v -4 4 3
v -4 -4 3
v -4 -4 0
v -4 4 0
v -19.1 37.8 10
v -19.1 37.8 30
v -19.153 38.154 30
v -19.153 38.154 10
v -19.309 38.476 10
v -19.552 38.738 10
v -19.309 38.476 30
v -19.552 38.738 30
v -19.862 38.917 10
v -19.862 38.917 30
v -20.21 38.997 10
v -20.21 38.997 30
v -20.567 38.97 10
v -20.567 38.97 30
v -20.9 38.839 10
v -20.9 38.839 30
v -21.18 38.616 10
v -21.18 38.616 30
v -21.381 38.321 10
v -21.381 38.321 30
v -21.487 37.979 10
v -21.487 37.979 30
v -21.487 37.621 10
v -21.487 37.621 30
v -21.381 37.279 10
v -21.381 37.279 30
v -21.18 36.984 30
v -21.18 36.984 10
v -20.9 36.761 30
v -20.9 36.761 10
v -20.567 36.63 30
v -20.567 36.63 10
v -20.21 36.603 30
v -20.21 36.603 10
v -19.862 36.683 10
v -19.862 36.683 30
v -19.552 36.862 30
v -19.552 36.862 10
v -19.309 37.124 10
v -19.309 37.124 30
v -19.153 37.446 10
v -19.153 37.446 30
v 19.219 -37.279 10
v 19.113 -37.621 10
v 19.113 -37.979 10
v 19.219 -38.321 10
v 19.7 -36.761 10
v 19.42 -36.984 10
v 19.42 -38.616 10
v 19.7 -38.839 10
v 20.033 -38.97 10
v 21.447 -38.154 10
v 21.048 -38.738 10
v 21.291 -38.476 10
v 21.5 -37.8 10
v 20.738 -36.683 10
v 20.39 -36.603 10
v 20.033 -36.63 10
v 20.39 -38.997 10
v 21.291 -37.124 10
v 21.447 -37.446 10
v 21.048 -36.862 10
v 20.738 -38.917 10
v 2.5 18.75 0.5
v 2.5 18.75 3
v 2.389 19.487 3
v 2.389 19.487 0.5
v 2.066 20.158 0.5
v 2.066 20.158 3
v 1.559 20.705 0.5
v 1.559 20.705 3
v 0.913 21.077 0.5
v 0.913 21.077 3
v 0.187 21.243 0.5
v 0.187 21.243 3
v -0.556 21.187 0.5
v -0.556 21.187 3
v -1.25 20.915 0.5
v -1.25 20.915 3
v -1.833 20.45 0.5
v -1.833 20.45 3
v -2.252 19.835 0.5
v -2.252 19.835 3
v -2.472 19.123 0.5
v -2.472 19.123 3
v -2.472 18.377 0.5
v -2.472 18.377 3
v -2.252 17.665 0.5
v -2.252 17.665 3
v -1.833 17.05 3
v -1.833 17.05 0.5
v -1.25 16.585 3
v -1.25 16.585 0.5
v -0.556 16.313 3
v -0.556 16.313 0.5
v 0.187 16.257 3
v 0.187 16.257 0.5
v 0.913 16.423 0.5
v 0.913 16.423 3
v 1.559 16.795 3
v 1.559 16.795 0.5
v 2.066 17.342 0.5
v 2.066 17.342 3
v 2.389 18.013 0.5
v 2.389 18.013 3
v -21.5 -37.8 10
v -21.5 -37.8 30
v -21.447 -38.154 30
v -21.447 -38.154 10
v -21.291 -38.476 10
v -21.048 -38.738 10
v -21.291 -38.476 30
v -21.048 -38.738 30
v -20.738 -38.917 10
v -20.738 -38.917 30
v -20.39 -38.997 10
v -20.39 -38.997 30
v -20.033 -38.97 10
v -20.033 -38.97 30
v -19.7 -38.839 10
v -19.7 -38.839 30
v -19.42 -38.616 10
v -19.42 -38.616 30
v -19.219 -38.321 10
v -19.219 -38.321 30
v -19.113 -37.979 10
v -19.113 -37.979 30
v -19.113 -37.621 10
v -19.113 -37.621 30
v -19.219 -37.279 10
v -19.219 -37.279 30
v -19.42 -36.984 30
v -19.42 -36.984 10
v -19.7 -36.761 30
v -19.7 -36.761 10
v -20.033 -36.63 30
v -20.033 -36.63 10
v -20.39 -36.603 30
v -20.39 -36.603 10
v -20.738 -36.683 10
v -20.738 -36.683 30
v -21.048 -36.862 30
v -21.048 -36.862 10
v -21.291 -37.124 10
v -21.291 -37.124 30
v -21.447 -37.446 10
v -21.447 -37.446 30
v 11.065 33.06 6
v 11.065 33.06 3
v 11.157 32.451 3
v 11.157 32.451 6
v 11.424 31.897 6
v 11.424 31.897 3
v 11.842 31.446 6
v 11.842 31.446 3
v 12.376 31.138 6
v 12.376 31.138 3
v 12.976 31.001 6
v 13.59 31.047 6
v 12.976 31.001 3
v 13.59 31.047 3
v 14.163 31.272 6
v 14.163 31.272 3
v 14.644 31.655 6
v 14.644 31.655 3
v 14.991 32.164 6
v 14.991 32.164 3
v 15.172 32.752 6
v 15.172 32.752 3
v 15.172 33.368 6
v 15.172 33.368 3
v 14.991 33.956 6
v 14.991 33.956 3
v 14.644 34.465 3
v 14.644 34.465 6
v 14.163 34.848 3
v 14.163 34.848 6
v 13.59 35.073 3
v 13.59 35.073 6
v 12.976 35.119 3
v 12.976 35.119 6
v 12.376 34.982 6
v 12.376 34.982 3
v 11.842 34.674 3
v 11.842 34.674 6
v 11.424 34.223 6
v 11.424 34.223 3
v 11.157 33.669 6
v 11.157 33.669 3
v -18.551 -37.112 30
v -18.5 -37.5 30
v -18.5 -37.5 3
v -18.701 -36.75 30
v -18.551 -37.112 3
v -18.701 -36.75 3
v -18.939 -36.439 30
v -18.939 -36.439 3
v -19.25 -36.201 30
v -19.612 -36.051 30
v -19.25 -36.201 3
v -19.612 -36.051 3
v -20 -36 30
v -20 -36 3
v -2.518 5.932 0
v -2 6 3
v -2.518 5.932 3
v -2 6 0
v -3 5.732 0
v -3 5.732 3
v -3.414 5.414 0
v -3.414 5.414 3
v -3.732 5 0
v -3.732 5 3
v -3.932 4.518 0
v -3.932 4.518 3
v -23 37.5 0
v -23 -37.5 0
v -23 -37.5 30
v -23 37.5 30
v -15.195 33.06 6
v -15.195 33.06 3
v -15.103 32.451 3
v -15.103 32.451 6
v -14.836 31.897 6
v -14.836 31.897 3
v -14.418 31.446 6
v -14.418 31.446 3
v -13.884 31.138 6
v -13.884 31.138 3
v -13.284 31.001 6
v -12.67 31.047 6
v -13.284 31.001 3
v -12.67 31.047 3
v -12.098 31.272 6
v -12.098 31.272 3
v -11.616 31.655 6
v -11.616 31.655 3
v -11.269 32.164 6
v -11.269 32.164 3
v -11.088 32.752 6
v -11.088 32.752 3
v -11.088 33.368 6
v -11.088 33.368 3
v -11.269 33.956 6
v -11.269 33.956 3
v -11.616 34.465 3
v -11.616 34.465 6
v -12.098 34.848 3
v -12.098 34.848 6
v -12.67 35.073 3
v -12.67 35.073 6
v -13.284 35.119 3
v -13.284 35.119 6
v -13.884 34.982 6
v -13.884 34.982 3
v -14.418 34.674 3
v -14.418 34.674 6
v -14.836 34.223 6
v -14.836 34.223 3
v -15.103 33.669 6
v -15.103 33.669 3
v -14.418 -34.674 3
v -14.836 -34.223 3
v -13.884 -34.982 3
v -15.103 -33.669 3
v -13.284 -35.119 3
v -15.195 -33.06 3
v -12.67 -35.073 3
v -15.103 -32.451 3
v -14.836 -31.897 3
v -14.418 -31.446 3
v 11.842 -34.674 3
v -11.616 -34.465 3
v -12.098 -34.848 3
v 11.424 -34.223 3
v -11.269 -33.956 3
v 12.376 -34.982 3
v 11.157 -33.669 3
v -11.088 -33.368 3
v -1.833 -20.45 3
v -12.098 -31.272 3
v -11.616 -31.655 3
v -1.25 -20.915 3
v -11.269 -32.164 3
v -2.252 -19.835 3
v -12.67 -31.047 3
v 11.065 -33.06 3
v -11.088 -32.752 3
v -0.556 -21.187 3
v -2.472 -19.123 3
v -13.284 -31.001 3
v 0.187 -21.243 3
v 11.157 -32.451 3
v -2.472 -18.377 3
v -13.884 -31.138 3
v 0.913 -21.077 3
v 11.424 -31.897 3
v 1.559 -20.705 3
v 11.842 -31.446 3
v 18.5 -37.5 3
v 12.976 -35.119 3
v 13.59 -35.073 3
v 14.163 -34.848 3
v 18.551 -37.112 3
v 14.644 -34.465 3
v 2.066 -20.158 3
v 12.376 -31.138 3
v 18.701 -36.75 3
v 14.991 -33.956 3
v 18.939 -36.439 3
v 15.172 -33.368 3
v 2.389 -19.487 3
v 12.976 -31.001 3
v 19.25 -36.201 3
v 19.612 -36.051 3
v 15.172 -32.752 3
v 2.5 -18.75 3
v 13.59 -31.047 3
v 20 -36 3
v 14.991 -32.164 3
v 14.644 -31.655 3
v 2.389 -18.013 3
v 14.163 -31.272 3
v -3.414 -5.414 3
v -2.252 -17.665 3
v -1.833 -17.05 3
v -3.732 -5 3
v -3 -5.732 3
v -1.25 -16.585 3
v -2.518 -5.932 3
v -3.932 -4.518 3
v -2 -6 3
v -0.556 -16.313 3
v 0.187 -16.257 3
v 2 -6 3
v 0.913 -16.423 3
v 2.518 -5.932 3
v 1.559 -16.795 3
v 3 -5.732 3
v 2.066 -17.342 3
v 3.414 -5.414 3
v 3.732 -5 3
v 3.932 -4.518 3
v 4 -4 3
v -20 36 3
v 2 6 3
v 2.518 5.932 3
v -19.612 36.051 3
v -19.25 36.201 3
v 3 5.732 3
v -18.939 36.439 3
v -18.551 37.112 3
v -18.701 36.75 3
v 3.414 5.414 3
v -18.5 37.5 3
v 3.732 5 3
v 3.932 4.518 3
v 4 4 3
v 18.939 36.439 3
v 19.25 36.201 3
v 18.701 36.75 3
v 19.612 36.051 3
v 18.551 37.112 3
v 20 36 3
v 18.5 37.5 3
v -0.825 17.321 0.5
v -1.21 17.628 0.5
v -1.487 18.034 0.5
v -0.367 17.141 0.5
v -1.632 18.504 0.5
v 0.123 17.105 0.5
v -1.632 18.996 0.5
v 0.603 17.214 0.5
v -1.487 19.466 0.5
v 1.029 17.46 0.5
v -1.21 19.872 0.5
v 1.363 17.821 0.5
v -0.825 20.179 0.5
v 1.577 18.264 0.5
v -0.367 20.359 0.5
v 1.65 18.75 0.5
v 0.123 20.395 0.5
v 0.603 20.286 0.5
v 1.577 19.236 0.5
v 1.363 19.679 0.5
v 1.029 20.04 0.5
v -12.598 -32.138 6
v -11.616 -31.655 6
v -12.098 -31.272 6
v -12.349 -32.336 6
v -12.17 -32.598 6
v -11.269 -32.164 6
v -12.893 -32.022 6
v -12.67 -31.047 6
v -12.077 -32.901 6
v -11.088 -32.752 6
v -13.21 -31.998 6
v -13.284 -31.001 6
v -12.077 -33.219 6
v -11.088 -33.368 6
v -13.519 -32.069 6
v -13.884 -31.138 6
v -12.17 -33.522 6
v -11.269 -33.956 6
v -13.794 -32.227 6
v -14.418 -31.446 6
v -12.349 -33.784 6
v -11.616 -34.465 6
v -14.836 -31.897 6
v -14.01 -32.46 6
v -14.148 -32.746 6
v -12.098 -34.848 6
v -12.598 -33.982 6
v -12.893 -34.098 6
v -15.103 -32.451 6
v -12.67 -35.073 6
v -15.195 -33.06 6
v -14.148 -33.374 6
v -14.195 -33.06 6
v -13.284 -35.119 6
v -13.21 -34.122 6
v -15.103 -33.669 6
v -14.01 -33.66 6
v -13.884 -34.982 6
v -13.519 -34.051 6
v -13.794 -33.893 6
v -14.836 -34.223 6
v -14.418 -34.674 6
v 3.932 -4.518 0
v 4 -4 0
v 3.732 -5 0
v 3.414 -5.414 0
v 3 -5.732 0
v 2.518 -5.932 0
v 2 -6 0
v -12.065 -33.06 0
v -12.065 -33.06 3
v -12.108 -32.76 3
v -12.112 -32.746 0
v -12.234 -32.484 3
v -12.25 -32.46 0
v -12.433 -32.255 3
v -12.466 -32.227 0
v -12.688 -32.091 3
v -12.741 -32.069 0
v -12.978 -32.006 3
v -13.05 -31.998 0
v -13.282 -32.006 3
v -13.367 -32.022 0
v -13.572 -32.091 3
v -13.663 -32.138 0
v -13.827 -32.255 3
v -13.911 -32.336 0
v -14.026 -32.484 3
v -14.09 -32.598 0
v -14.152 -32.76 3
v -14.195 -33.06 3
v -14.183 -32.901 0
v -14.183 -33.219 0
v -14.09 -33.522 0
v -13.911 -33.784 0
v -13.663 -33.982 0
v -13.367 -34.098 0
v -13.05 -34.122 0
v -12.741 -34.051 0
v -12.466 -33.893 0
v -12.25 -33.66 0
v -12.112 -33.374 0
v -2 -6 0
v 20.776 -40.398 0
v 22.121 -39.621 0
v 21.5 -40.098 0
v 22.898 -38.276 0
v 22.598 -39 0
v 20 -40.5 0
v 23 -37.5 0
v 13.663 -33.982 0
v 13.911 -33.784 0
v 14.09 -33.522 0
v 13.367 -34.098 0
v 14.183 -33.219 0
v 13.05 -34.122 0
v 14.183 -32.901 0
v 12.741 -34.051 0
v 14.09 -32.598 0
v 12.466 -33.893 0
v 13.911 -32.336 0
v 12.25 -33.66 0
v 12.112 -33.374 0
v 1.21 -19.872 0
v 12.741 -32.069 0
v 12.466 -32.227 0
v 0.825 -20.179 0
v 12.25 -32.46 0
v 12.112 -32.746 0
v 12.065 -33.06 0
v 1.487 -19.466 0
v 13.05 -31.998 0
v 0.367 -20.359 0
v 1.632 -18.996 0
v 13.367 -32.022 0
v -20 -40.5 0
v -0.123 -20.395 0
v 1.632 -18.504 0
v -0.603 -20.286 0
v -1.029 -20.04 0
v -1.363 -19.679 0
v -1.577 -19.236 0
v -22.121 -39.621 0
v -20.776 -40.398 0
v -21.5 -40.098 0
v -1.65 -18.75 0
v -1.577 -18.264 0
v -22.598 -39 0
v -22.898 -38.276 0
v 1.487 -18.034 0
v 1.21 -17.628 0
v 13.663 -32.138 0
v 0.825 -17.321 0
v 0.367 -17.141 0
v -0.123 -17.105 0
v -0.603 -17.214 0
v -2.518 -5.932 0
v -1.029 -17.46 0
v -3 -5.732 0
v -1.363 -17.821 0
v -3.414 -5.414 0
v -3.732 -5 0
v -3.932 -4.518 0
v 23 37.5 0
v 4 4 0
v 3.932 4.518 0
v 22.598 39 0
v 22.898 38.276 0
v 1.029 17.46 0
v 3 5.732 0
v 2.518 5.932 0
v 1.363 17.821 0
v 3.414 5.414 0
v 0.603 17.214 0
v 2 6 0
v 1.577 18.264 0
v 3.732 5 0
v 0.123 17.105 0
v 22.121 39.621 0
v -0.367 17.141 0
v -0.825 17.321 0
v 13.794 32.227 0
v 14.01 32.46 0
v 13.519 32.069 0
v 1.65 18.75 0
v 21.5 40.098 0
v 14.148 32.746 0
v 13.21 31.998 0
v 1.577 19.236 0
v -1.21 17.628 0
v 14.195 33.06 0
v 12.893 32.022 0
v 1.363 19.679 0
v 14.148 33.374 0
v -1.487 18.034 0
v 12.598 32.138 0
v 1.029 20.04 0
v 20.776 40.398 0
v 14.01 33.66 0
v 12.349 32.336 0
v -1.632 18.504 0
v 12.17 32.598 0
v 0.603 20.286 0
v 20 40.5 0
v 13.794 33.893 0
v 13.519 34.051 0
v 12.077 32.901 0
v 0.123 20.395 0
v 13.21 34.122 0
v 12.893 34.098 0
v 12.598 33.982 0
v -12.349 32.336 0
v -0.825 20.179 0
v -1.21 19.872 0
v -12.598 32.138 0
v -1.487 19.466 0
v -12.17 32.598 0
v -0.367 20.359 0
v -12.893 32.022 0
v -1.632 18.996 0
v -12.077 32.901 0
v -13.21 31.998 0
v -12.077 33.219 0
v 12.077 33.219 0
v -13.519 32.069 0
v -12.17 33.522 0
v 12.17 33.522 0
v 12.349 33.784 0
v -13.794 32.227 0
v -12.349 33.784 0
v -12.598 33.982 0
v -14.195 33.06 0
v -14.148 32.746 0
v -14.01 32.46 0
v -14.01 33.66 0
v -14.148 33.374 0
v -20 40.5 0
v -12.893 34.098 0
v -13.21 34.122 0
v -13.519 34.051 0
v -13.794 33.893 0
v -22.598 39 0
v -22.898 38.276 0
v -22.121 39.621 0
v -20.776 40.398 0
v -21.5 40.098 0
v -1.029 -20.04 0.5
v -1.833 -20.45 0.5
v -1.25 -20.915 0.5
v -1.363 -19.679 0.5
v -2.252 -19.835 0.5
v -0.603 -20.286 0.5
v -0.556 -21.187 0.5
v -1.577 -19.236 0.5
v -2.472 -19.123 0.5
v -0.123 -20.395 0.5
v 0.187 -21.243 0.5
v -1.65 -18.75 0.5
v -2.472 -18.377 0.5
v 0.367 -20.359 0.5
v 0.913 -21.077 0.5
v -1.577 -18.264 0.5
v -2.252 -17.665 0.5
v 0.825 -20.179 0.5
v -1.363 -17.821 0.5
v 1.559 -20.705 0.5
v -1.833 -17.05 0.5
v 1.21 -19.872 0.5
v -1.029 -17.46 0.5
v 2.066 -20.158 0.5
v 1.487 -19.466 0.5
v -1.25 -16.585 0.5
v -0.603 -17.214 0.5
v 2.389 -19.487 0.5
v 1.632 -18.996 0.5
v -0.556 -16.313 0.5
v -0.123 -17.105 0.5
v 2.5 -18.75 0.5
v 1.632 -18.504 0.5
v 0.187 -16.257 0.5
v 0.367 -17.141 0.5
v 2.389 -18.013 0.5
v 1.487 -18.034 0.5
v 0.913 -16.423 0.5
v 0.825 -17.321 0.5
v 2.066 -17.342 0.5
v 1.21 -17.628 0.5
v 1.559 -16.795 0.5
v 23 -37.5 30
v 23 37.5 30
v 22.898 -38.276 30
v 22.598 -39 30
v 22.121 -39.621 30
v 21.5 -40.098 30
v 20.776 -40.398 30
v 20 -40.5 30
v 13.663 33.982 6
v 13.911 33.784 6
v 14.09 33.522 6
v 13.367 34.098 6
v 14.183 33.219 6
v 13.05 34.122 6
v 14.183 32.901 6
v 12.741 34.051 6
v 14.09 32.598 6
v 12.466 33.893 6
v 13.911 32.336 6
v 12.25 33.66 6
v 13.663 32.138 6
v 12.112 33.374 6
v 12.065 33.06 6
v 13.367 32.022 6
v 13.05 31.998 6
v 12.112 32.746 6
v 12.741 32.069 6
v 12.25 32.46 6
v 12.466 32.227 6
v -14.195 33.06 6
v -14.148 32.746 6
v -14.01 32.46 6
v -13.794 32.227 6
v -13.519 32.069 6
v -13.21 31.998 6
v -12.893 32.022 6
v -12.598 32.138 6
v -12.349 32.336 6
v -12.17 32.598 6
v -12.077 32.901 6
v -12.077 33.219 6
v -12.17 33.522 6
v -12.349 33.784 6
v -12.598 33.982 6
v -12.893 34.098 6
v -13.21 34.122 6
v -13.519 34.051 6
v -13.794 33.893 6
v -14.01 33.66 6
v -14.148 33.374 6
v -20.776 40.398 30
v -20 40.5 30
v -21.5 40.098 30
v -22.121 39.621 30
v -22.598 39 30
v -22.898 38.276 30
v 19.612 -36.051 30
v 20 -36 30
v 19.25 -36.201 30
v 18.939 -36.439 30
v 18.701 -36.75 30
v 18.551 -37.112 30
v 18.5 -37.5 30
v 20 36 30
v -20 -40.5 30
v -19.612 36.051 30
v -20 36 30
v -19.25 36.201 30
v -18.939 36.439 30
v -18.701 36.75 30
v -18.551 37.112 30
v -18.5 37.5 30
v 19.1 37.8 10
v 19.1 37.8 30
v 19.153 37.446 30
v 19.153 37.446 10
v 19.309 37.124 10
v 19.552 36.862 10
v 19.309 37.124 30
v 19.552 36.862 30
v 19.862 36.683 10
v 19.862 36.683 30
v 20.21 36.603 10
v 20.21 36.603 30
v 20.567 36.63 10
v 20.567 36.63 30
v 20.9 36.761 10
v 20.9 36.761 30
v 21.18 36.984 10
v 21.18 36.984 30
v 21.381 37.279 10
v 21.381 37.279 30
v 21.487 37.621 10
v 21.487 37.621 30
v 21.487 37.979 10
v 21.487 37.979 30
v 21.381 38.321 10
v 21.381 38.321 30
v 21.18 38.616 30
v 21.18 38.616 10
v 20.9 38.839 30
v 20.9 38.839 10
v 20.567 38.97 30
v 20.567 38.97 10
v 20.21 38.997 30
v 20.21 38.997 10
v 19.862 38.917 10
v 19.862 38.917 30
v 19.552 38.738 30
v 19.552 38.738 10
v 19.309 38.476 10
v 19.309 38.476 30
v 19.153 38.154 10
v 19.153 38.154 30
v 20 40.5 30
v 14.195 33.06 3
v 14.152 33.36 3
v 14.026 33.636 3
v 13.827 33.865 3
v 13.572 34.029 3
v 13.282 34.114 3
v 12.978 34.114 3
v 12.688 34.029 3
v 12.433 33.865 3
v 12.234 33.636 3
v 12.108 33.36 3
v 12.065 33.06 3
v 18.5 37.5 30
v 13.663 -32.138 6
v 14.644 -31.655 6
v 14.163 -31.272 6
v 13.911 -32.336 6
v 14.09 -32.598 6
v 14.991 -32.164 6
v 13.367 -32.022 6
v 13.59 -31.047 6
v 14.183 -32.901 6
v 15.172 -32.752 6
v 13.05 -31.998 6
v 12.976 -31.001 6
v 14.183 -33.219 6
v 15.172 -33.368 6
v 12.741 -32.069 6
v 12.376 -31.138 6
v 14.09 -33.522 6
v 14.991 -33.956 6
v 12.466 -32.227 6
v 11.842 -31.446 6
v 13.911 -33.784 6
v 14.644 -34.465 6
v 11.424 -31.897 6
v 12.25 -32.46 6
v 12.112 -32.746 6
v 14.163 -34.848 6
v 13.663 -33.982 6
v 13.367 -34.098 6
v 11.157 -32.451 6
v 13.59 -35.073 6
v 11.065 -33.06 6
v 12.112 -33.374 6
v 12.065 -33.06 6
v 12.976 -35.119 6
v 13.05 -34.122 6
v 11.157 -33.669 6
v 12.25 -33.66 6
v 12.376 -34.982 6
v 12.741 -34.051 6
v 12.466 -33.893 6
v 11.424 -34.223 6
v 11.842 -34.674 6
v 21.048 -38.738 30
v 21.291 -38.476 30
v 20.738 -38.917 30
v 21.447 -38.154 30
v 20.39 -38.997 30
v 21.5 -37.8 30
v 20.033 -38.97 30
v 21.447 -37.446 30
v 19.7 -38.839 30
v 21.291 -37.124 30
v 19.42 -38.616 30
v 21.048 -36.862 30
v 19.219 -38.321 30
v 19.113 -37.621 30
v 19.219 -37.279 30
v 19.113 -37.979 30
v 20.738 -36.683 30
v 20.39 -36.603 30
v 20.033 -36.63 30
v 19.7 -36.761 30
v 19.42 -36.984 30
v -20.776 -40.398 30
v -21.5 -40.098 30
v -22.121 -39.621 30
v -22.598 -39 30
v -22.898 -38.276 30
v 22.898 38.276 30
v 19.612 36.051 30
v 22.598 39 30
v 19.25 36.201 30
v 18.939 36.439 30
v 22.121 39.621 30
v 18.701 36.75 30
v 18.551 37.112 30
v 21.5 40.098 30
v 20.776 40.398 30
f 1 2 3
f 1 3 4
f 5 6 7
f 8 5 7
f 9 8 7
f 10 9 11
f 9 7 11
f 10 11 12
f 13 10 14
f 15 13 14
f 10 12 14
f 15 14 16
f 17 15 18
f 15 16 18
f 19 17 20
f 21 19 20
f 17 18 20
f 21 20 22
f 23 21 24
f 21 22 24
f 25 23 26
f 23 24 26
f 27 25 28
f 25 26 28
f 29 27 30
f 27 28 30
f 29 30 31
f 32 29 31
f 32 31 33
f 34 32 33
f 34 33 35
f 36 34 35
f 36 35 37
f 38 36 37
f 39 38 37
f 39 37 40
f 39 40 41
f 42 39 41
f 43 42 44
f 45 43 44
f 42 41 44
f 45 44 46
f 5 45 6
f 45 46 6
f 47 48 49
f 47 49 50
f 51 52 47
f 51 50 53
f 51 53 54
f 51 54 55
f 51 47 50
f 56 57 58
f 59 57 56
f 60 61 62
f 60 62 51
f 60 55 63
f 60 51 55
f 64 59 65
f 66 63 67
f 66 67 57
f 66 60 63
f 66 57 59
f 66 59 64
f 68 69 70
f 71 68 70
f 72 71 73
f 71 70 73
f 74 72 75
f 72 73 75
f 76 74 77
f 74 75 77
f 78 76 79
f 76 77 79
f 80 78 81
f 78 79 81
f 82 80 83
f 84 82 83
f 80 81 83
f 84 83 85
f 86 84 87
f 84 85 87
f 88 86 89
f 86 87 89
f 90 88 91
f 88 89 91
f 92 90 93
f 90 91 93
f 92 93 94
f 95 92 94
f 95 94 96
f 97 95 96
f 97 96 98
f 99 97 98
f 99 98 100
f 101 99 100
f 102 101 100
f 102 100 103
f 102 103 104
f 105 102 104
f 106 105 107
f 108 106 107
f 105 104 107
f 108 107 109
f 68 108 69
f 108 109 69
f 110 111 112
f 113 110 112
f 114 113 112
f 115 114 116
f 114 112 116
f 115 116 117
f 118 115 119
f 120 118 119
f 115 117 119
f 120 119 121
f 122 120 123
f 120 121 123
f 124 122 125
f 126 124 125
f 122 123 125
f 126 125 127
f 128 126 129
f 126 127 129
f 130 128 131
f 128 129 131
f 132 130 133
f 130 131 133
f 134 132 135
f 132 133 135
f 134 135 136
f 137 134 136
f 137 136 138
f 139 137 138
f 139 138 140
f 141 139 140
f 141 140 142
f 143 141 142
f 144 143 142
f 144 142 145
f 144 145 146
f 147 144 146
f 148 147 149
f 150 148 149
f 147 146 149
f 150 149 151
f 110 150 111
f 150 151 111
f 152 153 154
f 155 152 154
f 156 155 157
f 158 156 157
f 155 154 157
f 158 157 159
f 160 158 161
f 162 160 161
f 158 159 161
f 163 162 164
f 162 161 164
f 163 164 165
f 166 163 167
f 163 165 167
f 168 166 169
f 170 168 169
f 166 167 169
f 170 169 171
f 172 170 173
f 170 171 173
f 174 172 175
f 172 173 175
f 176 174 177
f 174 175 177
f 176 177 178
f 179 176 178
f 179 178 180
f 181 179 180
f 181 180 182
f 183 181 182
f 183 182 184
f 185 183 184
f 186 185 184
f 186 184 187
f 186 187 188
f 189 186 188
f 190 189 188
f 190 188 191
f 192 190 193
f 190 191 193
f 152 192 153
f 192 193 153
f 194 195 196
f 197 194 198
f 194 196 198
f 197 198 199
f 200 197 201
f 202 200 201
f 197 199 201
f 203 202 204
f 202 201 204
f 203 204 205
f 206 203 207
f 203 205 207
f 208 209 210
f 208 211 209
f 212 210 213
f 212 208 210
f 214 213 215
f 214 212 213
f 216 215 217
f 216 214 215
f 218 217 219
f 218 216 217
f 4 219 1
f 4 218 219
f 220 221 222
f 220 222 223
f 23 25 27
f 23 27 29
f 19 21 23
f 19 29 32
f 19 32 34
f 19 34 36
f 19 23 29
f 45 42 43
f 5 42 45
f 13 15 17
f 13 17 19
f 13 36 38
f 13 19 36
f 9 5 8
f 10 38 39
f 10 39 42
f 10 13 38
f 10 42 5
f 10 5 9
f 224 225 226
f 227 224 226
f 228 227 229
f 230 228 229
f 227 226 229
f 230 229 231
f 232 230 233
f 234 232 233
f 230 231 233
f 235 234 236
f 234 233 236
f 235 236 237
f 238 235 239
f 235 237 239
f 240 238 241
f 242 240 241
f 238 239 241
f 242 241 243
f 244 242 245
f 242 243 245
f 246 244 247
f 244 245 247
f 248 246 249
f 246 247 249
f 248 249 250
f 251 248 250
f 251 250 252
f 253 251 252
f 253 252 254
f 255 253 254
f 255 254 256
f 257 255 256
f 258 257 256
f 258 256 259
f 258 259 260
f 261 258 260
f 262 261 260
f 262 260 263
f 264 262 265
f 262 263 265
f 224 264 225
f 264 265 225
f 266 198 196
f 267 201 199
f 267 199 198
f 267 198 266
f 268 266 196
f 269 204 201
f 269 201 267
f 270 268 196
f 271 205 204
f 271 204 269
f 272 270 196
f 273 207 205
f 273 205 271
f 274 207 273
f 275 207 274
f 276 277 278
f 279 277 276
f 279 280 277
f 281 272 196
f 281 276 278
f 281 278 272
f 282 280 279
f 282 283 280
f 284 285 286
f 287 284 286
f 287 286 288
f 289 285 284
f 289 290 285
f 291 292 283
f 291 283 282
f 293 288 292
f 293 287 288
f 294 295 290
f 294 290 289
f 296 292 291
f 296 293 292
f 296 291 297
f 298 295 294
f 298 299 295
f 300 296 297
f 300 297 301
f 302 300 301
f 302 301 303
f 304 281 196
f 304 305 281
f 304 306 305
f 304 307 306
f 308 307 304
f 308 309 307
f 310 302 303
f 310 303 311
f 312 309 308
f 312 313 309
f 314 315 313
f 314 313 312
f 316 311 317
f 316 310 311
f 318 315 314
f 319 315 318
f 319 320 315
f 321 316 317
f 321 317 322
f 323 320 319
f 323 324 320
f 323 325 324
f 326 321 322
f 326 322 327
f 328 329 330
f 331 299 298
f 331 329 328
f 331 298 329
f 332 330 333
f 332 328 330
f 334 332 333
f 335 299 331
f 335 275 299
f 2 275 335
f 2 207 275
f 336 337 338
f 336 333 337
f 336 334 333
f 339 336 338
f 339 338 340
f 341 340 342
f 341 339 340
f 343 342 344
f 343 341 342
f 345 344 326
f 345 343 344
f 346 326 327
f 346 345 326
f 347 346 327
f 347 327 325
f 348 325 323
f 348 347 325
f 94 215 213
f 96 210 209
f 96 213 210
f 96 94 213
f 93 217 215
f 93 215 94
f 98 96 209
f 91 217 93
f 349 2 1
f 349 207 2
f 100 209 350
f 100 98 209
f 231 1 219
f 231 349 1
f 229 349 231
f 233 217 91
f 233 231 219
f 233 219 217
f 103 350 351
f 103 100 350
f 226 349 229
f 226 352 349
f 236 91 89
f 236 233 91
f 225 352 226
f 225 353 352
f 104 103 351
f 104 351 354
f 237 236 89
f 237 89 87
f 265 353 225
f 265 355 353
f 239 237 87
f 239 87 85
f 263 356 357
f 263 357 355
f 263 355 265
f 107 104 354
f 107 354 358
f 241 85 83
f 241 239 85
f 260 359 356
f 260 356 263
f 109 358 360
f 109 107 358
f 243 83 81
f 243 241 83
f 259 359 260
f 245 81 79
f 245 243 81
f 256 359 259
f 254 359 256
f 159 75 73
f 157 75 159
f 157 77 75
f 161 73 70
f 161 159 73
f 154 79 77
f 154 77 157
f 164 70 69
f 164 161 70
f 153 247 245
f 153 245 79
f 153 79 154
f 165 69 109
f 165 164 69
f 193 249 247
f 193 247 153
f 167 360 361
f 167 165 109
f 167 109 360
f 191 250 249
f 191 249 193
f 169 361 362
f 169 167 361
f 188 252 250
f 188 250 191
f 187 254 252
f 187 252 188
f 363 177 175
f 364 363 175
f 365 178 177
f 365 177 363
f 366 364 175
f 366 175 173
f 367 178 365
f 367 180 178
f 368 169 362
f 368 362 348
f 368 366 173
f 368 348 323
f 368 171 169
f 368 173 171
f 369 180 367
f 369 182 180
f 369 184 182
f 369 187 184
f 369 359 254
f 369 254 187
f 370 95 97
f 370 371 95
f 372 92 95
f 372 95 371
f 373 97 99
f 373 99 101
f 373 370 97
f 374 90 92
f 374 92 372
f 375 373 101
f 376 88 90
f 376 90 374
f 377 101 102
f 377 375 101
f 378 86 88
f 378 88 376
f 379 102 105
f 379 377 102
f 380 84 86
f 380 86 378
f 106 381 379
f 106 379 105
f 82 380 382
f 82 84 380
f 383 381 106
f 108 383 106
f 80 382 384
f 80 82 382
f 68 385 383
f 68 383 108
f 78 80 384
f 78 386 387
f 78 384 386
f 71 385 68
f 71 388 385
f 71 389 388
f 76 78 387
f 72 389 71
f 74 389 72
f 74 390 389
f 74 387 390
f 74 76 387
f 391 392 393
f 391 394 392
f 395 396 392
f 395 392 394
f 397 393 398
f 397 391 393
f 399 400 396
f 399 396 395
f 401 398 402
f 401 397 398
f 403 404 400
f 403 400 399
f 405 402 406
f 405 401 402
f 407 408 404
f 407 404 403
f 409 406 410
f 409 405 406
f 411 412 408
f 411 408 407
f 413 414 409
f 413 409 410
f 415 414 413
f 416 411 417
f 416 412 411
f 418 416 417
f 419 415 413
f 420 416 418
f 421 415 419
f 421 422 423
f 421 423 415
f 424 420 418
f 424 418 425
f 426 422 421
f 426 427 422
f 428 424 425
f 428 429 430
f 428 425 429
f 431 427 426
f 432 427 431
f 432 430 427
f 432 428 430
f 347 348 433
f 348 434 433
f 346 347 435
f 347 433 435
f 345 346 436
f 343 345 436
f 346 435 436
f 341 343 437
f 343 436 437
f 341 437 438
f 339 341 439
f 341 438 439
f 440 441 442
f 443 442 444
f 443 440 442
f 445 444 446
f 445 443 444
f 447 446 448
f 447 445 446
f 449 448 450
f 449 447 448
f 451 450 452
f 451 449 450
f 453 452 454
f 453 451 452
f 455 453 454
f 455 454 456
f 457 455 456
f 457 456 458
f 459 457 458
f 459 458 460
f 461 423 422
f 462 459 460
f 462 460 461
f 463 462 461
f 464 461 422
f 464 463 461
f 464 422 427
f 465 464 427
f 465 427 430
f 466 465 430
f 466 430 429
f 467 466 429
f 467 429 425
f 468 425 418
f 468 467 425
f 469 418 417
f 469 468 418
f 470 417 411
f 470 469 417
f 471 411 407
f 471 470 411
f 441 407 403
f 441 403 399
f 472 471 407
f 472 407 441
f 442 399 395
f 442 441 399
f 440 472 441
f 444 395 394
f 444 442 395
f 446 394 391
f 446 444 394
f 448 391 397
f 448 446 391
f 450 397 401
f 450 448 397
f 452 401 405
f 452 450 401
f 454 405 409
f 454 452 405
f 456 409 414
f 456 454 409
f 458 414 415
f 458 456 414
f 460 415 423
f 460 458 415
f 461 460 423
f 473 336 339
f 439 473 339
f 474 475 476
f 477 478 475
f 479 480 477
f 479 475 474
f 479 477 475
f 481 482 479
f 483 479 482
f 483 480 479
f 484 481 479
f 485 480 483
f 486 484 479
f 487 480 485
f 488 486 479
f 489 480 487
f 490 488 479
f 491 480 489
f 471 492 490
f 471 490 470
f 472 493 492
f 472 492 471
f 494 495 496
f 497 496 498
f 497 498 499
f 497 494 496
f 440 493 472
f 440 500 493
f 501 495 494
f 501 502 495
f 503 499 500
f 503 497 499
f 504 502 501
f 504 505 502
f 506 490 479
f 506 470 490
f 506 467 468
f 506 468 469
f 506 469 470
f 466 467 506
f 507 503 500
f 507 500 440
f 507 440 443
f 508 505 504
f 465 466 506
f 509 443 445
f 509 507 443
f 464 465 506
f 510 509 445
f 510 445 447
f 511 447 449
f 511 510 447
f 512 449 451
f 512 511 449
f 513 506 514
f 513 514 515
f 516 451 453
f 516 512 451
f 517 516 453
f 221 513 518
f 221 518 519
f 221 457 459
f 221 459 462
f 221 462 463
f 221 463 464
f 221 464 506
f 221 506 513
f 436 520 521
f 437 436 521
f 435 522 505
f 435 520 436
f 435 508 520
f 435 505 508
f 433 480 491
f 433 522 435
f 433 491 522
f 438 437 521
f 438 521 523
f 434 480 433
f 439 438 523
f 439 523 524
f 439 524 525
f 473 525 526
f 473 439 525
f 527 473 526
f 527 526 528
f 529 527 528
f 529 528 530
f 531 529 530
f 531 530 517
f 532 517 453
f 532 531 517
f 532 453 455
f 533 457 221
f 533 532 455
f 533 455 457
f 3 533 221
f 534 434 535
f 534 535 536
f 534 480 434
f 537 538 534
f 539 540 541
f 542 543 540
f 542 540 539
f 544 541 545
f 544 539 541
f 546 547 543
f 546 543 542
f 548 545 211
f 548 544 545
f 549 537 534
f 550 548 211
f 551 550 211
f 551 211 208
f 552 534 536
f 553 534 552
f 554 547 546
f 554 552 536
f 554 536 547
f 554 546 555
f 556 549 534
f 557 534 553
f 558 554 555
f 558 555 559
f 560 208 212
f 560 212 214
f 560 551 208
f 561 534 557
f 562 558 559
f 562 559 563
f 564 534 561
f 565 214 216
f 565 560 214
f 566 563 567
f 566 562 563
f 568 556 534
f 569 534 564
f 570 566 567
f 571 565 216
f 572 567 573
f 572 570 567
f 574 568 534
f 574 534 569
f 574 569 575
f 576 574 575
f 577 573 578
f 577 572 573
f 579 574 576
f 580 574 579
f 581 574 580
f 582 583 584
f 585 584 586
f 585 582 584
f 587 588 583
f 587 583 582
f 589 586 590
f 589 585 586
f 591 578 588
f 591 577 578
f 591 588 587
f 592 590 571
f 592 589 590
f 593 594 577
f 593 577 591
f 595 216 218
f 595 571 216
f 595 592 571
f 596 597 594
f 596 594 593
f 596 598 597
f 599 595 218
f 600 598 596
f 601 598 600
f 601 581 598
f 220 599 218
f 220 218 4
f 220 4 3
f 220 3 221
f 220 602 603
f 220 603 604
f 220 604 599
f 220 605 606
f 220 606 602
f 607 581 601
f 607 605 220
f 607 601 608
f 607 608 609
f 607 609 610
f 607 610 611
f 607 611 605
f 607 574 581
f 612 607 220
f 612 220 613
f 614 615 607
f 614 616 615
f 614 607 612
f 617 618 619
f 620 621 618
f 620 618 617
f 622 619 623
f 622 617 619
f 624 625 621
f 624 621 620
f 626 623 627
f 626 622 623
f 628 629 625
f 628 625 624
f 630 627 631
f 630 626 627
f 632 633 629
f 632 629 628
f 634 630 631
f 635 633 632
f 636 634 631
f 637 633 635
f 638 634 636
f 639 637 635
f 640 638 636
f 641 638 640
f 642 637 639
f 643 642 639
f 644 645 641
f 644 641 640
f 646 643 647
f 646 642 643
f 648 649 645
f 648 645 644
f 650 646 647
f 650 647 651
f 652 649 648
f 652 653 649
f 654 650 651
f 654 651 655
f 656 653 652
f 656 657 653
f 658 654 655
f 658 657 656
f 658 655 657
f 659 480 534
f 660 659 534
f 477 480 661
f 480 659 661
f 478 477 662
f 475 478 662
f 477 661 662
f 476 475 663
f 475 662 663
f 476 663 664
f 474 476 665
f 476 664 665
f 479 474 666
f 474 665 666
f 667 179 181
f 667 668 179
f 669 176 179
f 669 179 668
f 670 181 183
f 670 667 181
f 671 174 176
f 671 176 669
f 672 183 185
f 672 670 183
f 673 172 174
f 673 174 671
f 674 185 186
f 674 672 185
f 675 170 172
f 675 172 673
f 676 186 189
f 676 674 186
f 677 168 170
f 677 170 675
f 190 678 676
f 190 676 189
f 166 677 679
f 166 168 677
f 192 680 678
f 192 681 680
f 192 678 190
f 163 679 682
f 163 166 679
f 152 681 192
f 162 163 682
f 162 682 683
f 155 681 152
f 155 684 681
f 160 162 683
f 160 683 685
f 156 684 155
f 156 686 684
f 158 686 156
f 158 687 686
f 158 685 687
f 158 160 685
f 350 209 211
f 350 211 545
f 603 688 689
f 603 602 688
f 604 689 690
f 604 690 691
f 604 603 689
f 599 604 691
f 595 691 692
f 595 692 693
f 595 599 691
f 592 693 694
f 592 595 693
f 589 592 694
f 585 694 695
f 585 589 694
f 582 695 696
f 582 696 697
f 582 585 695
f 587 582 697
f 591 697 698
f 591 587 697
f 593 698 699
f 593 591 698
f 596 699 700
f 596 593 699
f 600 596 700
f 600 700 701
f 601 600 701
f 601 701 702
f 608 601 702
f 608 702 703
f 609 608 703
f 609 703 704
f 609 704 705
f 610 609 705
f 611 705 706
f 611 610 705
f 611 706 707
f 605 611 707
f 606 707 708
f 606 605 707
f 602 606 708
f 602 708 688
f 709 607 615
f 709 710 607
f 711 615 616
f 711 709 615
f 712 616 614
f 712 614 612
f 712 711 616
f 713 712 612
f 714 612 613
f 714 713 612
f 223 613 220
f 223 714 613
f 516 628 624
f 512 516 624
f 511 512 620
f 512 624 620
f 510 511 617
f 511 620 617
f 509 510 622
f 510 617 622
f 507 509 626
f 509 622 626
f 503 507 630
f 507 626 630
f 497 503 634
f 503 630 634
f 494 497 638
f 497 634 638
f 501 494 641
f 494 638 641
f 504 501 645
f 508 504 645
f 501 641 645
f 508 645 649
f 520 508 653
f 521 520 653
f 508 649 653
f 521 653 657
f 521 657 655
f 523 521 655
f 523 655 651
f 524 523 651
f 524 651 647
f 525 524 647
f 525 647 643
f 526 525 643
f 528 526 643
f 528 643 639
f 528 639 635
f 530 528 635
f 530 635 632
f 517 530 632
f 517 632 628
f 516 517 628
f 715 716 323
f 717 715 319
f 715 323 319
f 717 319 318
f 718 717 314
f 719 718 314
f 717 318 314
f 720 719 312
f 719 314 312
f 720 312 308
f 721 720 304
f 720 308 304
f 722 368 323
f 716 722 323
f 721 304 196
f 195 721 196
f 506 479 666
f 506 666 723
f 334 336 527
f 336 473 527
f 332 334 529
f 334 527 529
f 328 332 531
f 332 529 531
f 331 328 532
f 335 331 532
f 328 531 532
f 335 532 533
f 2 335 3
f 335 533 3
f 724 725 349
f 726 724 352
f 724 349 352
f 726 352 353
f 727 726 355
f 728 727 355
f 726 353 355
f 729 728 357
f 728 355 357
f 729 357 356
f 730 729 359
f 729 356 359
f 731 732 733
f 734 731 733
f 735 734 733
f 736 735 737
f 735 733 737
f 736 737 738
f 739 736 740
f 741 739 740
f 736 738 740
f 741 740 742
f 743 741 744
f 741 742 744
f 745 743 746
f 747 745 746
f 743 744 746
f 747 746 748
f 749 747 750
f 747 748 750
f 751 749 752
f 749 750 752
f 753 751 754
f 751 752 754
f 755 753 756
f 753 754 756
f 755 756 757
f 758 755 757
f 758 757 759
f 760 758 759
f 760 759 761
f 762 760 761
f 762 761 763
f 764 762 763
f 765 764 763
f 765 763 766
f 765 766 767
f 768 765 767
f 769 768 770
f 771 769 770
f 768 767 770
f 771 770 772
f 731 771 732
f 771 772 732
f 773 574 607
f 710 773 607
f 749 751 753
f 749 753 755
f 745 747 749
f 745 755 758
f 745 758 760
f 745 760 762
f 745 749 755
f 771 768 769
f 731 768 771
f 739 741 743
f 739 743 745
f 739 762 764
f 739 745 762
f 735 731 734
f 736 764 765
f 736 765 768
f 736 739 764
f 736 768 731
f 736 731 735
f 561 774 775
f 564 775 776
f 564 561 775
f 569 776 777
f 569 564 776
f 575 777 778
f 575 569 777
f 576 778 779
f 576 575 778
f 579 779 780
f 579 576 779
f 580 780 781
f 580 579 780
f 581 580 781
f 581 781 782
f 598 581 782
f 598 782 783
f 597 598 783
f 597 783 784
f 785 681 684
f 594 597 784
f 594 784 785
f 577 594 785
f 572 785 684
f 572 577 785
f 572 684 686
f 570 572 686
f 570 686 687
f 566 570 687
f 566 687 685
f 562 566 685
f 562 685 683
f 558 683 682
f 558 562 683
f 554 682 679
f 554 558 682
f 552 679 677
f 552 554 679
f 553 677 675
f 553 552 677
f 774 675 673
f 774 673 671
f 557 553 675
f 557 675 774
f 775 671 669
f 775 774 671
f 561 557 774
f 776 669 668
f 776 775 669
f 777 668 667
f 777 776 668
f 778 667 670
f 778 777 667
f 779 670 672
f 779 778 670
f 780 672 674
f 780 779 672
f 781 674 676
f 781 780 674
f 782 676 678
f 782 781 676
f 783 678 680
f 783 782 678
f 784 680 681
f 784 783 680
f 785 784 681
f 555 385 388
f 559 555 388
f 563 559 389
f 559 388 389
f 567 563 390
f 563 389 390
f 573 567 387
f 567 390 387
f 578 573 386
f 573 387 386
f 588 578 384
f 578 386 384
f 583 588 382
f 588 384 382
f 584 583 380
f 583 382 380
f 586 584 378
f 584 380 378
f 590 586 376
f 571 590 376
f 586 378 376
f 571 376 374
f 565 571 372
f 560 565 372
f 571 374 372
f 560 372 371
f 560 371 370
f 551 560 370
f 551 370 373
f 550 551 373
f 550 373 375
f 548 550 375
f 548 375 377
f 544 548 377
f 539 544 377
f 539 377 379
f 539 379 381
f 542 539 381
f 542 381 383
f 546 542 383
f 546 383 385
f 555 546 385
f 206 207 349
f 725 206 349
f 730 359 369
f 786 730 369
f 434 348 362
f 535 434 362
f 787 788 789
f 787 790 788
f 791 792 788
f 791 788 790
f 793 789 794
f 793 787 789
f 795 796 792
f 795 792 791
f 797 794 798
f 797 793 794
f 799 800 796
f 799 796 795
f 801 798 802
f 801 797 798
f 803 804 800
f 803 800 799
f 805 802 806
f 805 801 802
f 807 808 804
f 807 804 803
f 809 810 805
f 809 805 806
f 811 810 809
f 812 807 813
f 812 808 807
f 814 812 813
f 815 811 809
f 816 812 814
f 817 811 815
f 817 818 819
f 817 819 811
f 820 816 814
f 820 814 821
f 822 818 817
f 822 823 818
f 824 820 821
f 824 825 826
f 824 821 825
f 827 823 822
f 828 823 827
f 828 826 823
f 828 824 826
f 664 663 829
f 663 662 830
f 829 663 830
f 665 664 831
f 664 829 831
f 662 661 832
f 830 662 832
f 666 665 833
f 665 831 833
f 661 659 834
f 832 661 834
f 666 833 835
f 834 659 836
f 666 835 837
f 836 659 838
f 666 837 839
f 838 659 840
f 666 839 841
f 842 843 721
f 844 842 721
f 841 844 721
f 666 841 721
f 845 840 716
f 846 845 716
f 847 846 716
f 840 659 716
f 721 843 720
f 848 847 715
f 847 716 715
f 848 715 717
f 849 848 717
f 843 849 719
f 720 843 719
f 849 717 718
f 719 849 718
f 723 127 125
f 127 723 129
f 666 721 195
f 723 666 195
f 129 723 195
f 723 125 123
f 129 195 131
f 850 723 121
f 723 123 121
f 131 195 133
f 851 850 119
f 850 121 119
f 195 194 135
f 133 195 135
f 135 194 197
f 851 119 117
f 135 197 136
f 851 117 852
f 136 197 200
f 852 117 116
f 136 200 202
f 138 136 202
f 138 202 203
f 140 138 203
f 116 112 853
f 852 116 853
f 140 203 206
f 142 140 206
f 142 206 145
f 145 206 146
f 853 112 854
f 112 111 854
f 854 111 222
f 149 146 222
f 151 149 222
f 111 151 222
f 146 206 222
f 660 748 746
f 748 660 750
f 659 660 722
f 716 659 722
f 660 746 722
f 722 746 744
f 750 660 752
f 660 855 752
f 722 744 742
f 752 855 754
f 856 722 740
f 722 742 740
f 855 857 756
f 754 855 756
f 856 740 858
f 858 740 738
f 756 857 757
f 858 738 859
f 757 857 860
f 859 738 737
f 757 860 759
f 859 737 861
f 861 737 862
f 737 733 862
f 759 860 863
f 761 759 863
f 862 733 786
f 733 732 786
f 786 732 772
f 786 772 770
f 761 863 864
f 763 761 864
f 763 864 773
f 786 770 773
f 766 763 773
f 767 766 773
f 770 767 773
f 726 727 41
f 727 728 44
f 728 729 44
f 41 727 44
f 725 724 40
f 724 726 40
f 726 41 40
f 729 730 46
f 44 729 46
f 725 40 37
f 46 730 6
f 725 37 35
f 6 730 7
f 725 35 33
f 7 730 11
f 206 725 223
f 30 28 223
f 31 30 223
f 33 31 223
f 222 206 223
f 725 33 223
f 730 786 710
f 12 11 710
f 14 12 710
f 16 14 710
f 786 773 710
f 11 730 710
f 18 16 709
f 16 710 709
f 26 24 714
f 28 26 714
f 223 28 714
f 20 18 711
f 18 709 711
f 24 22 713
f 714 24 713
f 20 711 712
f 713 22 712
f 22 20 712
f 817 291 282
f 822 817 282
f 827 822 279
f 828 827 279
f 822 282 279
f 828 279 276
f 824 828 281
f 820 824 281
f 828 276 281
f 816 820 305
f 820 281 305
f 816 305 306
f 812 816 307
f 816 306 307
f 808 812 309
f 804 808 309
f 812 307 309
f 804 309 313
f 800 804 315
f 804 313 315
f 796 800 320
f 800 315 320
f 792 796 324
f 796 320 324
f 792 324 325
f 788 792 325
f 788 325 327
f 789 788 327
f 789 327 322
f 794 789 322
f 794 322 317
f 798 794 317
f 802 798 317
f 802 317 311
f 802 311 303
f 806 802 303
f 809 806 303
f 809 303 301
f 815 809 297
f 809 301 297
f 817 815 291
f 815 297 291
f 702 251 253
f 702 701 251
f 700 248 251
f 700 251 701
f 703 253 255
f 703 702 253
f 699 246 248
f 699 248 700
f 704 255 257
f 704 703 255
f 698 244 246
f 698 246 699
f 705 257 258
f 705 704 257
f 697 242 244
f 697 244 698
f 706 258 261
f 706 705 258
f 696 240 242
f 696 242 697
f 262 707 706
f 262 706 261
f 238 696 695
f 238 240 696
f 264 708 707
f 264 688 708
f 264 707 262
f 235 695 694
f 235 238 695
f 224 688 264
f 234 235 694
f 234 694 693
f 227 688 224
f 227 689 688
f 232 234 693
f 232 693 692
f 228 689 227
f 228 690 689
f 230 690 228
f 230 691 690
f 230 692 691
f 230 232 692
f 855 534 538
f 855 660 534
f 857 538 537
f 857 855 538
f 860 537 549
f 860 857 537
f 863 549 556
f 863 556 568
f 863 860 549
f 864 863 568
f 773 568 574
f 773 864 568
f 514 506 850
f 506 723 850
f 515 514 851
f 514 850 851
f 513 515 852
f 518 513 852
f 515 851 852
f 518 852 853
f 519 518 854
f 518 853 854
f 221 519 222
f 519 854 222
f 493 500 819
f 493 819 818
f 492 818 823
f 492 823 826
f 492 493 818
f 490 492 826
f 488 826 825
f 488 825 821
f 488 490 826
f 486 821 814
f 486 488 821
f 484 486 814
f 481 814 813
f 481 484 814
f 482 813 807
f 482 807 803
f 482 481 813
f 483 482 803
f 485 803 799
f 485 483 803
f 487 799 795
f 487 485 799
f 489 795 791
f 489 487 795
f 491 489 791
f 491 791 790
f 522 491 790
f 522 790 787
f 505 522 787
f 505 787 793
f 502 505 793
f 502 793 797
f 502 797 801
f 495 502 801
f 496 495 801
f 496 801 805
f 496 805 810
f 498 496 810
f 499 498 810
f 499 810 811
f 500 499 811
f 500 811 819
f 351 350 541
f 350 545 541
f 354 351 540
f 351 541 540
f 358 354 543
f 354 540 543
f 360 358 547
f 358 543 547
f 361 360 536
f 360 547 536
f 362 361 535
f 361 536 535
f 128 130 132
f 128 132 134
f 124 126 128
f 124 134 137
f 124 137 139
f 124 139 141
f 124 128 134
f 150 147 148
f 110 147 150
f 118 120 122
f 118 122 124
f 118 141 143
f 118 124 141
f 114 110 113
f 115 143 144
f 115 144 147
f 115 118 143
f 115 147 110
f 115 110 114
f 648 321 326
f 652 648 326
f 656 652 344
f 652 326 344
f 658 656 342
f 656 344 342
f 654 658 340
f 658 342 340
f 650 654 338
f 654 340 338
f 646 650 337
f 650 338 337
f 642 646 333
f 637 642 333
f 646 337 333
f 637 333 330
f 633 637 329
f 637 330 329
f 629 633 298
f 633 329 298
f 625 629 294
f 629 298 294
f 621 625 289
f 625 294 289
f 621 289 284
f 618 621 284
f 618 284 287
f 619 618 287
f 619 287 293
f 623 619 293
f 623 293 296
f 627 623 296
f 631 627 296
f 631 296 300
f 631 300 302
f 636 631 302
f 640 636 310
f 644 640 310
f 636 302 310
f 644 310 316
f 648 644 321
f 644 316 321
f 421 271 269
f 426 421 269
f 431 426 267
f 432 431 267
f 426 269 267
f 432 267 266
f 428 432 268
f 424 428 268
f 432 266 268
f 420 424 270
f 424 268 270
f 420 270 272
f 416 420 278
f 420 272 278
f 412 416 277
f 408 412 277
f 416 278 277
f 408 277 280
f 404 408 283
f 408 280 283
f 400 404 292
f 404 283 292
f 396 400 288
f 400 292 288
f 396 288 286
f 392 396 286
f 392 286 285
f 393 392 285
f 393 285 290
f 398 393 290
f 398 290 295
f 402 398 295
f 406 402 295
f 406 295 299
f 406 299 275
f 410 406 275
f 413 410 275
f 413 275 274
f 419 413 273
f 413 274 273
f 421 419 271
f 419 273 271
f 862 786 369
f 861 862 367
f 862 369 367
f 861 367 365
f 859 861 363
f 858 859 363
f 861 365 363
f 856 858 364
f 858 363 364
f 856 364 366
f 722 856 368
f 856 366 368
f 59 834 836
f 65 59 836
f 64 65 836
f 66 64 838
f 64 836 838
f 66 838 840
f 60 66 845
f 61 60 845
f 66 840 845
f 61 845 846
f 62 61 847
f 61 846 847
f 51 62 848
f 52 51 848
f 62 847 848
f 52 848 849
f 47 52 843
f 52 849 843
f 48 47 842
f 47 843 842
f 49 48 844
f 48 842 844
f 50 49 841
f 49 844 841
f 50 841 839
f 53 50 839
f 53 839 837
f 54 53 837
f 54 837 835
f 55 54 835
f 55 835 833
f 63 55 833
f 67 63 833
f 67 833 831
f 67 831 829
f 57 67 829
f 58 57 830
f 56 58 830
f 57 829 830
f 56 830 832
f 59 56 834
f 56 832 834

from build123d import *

# Parameters (mm, degrees)
SKETCH1_W           = 40
SKETCH1_H           = 75
SKETCH1_R           = 1.065
BOSS_EXTRUDE1_DEPTH = 3
SKETCH2_R           = 2.065
SKETCH2_R_2         = 1.065
BOSS_EXTRUDE2_DEPTH = 3
SKETCH4_W           = 46
SKETCH4_H           = 81
BOSS_EXTRUDE3_DEPTH = 30
SKETCH5_W           = 8
SKETCH5_H           = 12
CUT_EXTRUDE1_DEPTH  = 25
FILLET2_R           = 2
SKETCH6_R           = 1.2
CUT_EXTRUDE2_DEPTH  = 20
SKETCH7_R           = 1.65
CUT_EXTRUDE3_DEPTH  = 20
SKETCH8_R           = 2.5
CUT_EXTRUDE4_DEPTH  = 2.5
FILLET3_R           = 3


with BuildPart() as part:
    # Sketch1 → Boss-Extrude1 (new body)
    with BuildSketch(Plane.XY):
        Rectangle(SKETCH1_W, SKETCH1_H)
        with Locations((13.13, 33.06)):
            Circle(SKETCH1_R, mode=Mode.SUBTRACT)
        with Locations(Location((-13.13, 33.06, 0), (0, 0, 180))):
            Circle(SKETCH1_R, mode=Mode.SUBTRACT)
        with Locations((-13.13, -33.06)):
            Circle(SKETCH1_R, mode=Mode.SUBTRACT)
        with Locations(Location((13.13, -33.06, 0), (0, 0, 180))):
            Circle(SKETCH1_R, mode=Mode.SUBTRACT)
    extrude(amount=BOSS_EXTRUDE1_DEPTH)

    # Sketch2 → Boss-Extrude2 (add)
    # profile 1 of 4: a face of its own
    with BuildSketch(Plane.XY.offset(3)):
        with Locations(Location((-13.13, 33.06, 0), (0, 0, 180))):
            Circle(SKETCH2_R)
        with Locations(Location((-13.13, 33.06, 0), (0, 0, 180))):
            Circle(SKETCH2_R_2, mode=Mode.SUBTRACT)
    # profile 2 of 4: a face of its own
    with BuildSketch(Plane.XY.offset(3)):
        with Locations(Location((13.13, 33.06, 0), (0, 0, 180))):
            Circle(SKETCH2_R)
        with Locations(Location((13.13, 33.06, 0), (0, 0, 180))):
            Circle(SKETCH2_R_2, mode=Mode.SUBTRACT)
    # profile 3 of 4: a face of its own
    with BuildSketch(Plane.XY.offset(3)):
        with Locations(Location((13.13, -33.06, 0), (0, 0, 180))):
            Circle(SKETCH2_R)
        with Locations(Location((13.13, -33.06, 0), (0, 0, 180))):
            Circle(SKETCH2_R_2, mode=Mode.SUBTRACT)
    # profile 4 of 4: a face of its own
    with BuildSketch(Plane.XY.offset(3)):
        with Locations(Location((-13.13, -33.06, 0), (0, 0, 180))):
            Circle(SKETCH2_R)
        with Locations(Location((-13.13, -33.06, 0), (0, 0, 180))):
            Circle(SKETCH2_R_2, mode=Mode.SUBTRACT)
    extrude(amount=BOSS_EXTRUDE2_DEPTH)

    # Sketch4 → Boss-Extrude3 (add)
    with BuildSketch(Plane(origin=(0, 0, 0), x_dir=(-1, 0, 0), z_dir=(0, 0, -1))):
        Rectangle(SKETCH4_W, SKETCH4_H)
        with BuildLine():
            Line((-18.5, -37.5), (18.5, -37.5))
            ThreePointArc((18.5, -37.5), (18.939339828, -36.439339828), (20, -36))
            Line((20, -36), (20, 36))
            ThreePointArc((20, 36), (18.939339828, 36.439339828), (18.5, 37.5))
            Line((18.5, 37.5), (-18.5, 37.5))
            ThreePointArc((-18.5, 37.5), (-18.939339828, 36.439339828), (-20, 36))
            Line((-20, 36), (-20, -36))
            ThreePointArc((-20, -36), (-18.939339828, -36.439339828), (-18.5, -37.5))
        make_face(mode=Mode.SUBTRACT)
    extrude(amount=-BOSS_EXTRUDE3_DEPTH)

    # Sketch5 → Cut-Extrude1 (cut)
    with BuildSketch(Plane.XY.offset(3)):
        Rectangle(SKETCH5_W, SKETCH5_H)
    extrude(amount=-CUT_EXTRUDE1_DEPTH, mode=Mode.SUBTRACT)

    # Fillet2
    fillet2_edges = [part.edges().sort_by_distance(p)[0] for p in [
        (4, 6, 1.5),
        (4, -6, 1.5),
        (-4, -6, 1.5),
        (-4, 6, 1.5),
    ]]
    fillet(fillet2_edges, radius=FILLET2_R)

    # Sketch6 → Cut-Extrude2 (cut)
    with BuildSketch(Plane.XY.offset(30)):
        with Locations((-20.3, 37.8)):
            Circle(SKETCH6_R)
        with Locations(Location((20.3, 37.8, 0), (0, 0, 180))):
            Circle(SKETCH6_R)
        with Locations((20.3, -37.8)):
            Circle(SKETCH6_R)
        with Locations(Location((-20.3, -37.8, 0), (0, 0, 180))):
            Circle(SKETCH6_R)
    extrude(amount=-CUT_EXTRUDE2_DEPTH, mode=Mode.SUBTRACT)

    # Sketch7 → Cut-Extrude3 (cut)
    with BuildSketch(Plane.XY.offset(3)):
        with Locations((0, 18.75)):
            Circle(SKETCH7_R)
        with Locations(Location((0, -18.75, 0), (0, 0, 180))):
            Circle(SKETCH7_R)
    extrude(amount=-CUT_EXTRUDE3_DEPTH, mode=Mode.SUBTRACT)

    # Sketch8 → Cut-Extrude4 (cut)
    with BuildSketch(Plane.XY.offset(3)):
        with Locations((0, 18.75)):
            Circle(SKETCH8_R)
        with Locations((0, -18.75)):
            Circle(SKETCH8_R)
    extrude(amount=-CUT_EXTRUDE4_DEPTH, mode=Mode.SUBTRACT)

    # Fillet3
    fillet3_edges = [part.edges().sort_by_distance(p)[0] for p in [
        (-23, 40.5, 15),
        (-23, -40.5, 15),
        (23, -40.5, 15),
        (23, 40.5, 15),
    ]]
    fillet(fillet3_edges, radius=FILLET3_R)


solid = part.part
